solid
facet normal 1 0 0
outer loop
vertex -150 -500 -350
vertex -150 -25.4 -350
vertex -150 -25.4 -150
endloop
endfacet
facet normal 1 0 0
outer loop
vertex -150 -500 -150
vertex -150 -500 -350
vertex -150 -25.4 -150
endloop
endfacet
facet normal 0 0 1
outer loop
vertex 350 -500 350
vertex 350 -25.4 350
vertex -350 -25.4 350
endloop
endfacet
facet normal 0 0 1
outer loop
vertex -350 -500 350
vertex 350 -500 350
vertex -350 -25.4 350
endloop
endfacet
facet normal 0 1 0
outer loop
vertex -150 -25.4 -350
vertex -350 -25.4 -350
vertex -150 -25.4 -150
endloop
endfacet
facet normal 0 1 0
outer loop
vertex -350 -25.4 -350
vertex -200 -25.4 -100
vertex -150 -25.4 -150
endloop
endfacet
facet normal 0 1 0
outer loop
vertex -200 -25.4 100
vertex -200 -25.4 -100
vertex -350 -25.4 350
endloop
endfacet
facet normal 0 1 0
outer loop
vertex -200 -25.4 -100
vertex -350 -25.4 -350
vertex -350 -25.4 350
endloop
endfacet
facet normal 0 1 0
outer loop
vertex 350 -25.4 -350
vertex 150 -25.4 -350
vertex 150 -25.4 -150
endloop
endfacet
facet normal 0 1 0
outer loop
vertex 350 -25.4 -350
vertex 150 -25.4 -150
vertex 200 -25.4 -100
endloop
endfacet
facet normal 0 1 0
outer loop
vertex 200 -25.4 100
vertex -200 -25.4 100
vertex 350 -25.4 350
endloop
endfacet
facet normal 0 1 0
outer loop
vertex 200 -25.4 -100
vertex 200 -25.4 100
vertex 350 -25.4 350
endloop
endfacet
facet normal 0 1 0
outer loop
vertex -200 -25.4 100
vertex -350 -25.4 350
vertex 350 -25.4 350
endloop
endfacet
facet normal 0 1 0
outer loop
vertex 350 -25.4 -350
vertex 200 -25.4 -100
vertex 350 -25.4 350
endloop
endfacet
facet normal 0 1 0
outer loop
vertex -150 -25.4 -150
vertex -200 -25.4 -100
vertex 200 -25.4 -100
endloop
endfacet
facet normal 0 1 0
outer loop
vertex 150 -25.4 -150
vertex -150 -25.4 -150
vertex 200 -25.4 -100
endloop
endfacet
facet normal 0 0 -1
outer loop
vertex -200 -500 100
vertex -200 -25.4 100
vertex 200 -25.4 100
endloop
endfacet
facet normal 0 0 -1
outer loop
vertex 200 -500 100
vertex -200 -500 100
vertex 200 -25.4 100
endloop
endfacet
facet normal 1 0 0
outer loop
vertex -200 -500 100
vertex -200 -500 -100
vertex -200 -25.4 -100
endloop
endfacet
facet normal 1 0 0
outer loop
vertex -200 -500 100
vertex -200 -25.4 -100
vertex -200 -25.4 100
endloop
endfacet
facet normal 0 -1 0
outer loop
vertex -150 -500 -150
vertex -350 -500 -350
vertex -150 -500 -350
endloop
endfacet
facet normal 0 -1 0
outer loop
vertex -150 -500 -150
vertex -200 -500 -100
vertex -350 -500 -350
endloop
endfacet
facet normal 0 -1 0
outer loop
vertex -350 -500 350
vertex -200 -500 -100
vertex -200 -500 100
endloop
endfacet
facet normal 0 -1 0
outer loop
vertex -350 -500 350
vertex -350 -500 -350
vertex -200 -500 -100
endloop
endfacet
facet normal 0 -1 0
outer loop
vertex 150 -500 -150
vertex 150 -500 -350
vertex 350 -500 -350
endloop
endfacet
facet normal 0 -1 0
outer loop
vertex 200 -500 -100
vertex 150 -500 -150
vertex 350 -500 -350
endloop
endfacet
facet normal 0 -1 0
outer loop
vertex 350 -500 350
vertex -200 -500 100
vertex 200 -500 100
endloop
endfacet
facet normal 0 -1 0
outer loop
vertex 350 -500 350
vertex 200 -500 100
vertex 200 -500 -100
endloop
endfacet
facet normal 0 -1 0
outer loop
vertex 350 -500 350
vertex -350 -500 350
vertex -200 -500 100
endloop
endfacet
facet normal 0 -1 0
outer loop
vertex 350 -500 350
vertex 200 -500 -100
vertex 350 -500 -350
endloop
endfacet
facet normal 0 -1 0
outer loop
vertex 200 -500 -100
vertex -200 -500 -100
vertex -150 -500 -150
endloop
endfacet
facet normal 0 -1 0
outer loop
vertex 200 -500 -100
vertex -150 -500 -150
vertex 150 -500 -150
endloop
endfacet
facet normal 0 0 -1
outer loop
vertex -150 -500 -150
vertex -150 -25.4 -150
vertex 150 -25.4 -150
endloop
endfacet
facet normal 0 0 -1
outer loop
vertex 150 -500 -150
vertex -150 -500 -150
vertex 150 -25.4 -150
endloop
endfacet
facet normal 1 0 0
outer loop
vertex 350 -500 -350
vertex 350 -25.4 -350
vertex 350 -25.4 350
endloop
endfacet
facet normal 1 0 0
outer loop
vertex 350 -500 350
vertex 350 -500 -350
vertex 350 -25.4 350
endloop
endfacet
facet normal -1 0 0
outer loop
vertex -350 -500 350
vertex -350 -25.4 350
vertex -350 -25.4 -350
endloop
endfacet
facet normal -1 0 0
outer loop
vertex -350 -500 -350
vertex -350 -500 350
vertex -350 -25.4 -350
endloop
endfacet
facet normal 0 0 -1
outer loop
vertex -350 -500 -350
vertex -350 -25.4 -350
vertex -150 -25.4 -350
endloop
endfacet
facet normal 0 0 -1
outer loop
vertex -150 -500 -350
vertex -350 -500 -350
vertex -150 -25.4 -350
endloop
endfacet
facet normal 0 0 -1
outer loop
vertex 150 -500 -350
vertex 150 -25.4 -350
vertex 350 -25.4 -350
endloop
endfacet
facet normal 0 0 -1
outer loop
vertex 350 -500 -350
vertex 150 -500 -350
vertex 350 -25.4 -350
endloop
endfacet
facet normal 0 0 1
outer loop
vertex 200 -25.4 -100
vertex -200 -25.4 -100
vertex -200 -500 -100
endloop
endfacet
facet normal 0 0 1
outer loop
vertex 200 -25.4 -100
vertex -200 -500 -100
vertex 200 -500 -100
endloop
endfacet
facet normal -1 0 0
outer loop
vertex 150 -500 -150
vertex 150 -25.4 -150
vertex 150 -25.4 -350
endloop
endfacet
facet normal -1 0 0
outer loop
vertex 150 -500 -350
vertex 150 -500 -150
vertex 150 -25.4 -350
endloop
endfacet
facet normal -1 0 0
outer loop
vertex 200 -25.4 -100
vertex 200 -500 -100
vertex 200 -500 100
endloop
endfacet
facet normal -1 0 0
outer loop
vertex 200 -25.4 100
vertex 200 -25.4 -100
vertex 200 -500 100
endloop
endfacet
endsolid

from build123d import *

# Parameters (mm, degrees)
F1_DEPTH = 500
F3_DEPTH = 25.4
F4_W     = 400
F4_H     = 200
F5_DEPTH = 474.601


# Not quite as in the source:
# - a feature names something its author has since deleted; it is built from what else it names


with BuildPart() as f1:
    # F0 (on Front) → F1 (new body)
    with BuildSketch(Plane.XZ):
        Polygon((350, -350), (350, 350), (-350, 350), (-350, -350), (-150, -350), (-150, -150), (150, -150), (150, -350), align=None)
    extrude(amount=F1_DEPTH)

    # F3 (cut): a face of the model
    f3_faces = [f1.faces().sort_by_distance(p)[0] for p in [
        (0, 0, 34.8837209302),
    ]]
    extrude(f3_faces, amount=-F3_DEPTH, mode=Mode.SUBTRACT)

    # F4 (on face) → F5 (cut, through all)
    with BuildSketch(Plane.XZ.offset(500)):
        Rectangle(F4_W, F4_H)
    extrude(amount=-F5_DEPTH, mode=Mode.SUBTRACT)


solid = f1.part
